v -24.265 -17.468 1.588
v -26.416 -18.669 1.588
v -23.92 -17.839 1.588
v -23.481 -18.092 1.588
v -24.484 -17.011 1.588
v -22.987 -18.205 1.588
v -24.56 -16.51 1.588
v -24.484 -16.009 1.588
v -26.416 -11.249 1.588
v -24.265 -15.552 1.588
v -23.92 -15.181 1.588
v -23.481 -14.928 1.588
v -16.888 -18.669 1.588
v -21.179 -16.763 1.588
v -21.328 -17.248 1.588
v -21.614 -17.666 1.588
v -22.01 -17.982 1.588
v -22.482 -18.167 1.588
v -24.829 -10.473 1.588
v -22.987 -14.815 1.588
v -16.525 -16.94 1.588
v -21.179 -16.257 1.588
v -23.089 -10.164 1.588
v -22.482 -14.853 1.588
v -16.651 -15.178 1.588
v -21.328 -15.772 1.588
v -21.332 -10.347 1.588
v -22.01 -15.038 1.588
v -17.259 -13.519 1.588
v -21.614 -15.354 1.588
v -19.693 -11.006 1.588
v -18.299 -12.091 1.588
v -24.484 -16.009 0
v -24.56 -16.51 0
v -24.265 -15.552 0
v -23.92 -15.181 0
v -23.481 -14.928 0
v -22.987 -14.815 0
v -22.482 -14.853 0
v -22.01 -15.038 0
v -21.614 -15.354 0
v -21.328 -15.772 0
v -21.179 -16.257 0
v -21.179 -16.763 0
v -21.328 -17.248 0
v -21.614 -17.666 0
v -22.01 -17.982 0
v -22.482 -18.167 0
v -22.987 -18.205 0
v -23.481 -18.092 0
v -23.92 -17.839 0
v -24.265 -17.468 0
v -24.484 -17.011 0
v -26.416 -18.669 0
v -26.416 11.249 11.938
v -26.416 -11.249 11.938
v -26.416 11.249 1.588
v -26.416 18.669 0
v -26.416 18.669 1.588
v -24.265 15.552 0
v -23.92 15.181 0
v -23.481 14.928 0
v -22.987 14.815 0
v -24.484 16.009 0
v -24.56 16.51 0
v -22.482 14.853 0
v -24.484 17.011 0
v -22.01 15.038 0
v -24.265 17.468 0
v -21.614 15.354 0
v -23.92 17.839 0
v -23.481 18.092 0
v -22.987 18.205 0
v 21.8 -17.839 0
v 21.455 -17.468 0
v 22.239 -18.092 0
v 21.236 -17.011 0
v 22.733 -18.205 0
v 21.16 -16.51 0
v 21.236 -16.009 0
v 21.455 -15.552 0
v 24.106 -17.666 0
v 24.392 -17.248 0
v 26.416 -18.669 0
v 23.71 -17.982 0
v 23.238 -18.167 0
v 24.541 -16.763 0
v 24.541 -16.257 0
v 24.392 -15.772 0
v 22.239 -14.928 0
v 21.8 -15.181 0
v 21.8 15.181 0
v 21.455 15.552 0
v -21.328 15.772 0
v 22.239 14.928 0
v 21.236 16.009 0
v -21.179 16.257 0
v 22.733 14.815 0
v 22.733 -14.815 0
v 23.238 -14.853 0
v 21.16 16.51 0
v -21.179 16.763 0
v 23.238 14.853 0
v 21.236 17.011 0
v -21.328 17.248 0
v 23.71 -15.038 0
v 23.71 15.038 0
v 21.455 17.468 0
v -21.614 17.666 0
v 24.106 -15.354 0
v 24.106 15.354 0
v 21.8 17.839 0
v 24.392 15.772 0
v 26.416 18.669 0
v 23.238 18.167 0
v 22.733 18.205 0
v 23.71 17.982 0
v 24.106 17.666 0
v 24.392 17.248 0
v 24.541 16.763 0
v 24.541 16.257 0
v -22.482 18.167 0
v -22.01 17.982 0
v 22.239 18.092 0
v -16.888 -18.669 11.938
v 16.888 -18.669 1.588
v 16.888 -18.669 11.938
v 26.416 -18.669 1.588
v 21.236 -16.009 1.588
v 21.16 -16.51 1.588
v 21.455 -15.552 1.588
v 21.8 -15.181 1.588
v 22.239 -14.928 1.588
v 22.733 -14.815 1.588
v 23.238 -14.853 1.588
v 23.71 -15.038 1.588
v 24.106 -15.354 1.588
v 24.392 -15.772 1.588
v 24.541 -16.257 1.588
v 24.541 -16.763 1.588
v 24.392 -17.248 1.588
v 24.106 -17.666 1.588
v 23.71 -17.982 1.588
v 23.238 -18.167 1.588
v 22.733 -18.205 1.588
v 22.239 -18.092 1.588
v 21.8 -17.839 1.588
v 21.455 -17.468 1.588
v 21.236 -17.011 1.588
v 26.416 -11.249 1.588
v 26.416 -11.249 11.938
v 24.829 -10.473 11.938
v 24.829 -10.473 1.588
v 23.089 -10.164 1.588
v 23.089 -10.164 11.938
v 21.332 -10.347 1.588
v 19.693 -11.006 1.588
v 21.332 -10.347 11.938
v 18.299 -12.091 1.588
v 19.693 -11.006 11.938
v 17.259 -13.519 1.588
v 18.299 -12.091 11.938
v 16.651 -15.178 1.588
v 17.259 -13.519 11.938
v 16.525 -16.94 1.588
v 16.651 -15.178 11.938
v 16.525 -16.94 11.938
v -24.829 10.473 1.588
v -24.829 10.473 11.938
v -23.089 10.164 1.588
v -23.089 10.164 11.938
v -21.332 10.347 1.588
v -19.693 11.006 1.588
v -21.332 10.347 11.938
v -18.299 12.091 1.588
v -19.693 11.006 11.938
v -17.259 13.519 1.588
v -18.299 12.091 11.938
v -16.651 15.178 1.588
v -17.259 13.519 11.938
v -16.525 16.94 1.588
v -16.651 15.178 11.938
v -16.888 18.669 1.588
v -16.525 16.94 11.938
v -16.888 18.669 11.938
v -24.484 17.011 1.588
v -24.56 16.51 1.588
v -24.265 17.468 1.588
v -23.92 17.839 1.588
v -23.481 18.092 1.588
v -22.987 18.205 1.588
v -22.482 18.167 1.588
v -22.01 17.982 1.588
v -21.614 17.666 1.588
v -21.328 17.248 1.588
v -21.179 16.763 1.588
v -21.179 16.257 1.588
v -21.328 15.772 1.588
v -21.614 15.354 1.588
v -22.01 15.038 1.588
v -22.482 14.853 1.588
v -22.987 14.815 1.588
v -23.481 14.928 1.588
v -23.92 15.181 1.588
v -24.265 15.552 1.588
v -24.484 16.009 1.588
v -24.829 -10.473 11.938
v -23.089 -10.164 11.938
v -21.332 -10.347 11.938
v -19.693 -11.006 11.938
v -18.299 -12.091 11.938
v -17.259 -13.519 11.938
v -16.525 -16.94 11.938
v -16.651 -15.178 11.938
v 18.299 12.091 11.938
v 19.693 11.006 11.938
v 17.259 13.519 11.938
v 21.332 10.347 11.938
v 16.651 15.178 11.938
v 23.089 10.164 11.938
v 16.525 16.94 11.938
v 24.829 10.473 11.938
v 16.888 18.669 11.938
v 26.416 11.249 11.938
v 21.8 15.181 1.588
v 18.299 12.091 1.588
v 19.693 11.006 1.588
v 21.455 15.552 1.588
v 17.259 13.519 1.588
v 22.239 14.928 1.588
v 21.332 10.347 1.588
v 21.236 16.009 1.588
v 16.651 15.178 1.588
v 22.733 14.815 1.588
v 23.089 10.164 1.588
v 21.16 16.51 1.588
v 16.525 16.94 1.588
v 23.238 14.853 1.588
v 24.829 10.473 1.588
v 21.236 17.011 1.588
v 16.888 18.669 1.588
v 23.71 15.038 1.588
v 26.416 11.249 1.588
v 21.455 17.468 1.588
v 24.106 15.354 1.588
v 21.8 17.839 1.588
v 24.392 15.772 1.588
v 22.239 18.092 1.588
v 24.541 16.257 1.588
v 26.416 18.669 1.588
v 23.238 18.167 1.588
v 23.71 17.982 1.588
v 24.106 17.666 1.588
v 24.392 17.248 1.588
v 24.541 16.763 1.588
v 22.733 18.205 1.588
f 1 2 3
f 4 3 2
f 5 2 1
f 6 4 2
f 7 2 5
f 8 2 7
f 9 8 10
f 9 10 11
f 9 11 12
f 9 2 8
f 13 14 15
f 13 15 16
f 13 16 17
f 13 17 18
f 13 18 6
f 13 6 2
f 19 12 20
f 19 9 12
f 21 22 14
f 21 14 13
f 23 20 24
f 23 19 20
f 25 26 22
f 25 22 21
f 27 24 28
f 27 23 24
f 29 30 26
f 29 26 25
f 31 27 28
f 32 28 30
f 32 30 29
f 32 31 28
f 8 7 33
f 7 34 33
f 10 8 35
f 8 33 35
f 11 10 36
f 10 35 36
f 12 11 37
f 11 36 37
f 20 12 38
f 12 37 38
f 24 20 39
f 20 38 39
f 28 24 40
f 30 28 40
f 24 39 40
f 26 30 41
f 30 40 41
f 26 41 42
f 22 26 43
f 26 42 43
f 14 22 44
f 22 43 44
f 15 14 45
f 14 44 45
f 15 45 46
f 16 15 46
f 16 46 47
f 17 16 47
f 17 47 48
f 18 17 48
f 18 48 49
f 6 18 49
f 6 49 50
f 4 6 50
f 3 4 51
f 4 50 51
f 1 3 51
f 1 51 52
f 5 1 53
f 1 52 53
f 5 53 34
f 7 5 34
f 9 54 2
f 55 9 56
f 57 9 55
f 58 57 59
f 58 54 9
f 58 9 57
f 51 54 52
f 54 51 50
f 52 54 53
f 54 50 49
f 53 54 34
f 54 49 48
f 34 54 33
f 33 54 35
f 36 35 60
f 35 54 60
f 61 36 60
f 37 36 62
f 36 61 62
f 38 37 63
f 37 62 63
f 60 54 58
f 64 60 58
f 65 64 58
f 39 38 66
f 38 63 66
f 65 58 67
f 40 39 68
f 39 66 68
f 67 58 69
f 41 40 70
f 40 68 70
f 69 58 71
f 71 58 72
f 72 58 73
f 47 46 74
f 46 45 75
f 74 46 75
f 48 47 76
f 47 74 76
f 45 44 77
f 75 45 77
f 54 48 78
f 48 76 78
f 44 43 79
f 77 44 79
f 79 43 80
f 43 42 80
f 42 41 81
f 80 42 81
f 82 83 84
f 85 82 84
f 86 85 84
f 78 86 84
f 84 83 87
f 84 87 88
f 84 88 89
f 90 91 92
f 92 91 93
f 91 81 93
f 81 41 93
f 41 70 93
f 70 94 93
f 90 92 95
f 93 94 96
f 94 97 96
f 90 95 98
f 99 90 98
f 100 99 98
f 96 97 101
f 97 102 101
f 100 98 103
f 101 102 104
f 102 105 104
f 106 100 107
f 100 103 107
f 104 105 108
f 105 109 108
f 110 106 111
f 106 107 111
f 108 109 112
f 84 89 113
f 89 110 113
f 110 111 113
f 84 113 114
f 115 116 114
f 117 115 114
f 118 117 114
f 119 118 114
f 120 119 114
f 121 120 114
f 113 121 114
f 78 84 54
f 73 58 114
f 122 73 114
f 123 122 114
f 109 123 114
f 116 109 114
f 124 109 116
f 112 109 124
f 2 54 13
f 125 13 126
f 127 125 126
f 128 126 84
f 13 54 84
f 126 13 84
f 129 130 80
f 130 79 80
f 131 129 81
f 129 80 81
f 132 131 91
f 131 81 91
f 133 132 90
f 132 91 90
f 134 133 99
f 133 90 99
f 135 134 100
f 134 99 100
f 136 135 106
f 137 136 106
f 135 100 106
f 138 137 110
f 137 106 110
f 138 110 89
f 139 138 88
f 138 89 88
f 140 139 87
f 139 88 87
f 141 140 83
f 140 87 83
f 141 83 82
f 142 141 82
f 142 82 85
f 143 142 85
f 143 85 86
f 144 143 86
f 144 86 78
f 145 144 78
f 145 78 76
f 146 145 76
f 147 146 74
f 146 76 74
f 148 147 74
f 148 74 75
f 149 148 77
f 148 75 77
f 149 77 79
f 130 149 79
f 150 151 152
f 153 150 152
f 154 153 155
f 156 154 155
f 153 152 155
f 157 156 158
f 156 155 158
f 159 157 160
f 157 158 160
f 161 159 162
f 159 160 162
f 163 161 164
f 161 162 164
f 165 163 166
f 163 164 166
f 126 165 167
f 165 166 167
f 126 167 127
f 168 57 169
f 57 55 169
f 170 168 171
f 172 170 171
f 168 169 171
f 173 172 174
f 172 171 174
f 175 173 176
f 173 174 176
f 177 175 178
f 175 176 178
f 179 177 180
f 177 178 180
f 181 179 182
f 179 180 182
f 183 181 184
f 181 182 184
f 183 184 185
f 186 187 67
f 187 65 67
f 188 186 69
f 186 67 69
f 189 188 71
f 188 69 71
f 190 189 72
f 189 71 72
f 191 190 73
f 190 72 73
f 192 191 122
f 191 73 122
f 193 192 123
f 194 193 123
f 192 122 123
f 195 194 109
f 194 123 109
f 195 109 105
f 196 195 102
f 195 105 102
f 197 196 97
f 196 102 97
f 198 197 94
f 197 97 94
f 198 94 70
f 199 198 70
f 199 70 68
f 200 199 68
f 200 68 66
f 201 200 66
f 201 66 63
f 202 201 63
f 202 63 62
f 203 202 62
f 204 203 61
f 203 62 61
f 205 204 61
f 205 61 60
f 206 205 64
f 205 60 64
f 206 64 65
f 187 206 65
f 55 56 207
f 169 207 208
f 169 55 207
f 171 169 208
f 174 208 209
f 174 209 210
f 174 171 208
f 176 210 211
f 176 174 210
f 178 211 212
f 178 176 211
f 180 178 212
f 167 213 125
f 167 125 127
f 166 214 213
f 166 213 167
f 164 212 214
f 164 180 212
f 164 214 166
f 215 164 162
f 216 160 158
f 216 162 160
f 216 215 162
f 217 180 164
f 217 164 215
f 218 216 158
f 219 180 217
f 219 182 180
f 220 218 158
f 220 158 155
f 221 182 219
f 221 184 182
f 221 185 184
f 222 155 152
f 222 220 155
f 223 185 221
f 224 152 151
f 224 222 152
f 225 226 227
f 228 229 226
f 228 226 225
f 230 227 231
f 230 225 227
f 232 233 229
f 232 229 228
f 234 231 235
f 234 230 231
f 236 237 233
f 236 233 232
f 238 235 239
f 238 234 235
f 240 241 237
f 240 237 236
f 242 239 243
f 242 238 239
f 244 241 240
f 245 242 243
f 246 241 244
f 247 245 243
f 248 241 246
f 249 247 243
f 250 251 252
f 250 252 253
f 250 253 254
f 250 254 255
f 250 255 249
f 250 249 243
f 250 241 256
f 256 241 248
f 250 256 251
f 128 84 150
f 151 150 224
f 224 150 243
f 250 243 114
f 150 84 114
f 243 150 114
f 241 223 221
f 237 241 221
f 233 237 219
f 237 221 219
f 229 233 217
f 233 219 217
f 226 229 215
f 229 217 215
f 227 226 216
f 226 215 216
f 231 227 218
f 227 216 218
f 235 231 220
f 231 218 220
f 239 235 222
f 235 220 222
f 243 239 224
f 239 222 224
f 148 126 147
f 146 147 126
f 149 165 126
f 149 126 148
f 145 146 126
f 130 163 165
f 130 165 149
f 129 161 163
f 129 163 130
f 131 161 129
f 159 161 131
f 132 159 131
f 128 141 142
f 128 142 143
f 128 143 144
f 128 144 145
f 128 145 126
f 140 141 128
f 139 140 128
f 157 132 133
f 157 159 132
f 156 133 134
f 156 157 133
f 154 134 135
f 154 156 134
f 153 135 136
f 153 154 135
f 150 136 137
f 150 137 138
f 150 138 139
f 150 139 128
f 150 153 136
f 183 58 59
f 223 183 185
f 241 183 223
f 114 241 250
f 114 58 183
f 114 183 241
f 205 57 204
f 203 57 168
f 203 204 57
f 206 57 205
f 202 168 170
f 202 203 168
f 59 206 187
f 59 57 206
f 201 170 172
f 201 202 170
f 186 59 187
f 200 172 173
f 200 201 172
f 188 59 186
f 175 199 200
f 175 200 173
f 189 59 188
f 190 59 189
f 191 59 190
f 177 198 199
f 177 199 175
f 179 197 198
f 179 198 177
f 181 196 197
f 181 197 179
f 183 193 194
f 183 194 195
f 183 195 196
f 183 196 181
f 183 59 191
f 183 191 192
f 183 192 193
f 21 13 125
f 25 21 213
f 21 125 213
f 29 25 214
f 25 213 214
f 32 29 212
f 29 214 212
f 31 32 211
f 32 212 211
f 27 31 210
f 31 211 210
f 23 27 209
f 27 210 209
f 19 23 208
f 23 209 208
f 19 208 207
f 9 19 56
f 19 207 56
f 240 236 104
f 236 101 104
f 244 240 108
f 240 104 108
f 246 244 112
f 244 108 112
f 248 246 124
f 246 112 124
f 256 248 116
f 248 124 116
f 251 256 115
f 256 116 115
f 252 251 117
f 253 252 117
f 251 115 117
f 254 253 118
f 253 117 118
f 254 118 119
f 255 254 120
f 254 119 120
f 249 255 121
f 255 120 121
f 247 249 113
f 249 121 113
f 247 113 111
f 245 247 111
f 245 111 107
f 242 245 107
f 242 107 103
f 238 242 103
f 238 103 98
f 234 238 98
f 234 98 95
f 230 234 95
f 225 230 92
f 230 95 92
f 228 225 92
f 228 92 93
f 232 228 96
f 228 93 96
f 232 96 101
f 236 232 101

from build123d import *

# Parameters (mm, degrees)
SKETCH1_W                = 52.832
SKETCH1_H                = 37.338
BOSS_EXTRUDE1_DEPTH      = 11.938
M3_CLEARANCE_HOLE1_D     = 3.4
M3_CLEARANCE_HOLE1_DEPTH = 11.938
SKETCH4_R                = 6.35
CUT_EXTRUDE1_DEPTH       = 10.3505


with BuildPart() as part:
    # Sketch1 → Boss-Extrude1 (new body)
    with BuildSketch(Plane.XY):
        Rectangle(SKETCH1_W, SKETCH1_H)
    extrude(amount=BOSS_EXTRUDE1_DEPTH)

    # M3 Clearance Hole1
    with Locations(Plane.XY.offset(11.938)):
        with Locations((-22.86, 16.51), (22.86, -16.51), (22.86, 16.51), (-22.86, -16.51)):
            Hole(M3_CLEARANCE_HOLE1_D / 2, depth=M3_CLEARANCE_HOLE1_DEPTH)

    # Sketch4 → Cut-Extrude1 (cut)
    with BuildSketch(Plane.XY.offset(11.938)):
        with Locations((-22.86, 16.51)):
            Circle(SKETCH4_R)
        with Locations((-22.86, -16.51)):
            Circle(SKETCH4_R)
        with Locations((22.86, 16.51)):
            Circle(SKETCH4_R)
        with Locations((22.86, -16.51)):
            Circle(SKETCH4_R)
    extrude(amount=-CUT_EXTRUDE1_DEPTH, mode=Mode.SUBTRACT)


solid = part.part
